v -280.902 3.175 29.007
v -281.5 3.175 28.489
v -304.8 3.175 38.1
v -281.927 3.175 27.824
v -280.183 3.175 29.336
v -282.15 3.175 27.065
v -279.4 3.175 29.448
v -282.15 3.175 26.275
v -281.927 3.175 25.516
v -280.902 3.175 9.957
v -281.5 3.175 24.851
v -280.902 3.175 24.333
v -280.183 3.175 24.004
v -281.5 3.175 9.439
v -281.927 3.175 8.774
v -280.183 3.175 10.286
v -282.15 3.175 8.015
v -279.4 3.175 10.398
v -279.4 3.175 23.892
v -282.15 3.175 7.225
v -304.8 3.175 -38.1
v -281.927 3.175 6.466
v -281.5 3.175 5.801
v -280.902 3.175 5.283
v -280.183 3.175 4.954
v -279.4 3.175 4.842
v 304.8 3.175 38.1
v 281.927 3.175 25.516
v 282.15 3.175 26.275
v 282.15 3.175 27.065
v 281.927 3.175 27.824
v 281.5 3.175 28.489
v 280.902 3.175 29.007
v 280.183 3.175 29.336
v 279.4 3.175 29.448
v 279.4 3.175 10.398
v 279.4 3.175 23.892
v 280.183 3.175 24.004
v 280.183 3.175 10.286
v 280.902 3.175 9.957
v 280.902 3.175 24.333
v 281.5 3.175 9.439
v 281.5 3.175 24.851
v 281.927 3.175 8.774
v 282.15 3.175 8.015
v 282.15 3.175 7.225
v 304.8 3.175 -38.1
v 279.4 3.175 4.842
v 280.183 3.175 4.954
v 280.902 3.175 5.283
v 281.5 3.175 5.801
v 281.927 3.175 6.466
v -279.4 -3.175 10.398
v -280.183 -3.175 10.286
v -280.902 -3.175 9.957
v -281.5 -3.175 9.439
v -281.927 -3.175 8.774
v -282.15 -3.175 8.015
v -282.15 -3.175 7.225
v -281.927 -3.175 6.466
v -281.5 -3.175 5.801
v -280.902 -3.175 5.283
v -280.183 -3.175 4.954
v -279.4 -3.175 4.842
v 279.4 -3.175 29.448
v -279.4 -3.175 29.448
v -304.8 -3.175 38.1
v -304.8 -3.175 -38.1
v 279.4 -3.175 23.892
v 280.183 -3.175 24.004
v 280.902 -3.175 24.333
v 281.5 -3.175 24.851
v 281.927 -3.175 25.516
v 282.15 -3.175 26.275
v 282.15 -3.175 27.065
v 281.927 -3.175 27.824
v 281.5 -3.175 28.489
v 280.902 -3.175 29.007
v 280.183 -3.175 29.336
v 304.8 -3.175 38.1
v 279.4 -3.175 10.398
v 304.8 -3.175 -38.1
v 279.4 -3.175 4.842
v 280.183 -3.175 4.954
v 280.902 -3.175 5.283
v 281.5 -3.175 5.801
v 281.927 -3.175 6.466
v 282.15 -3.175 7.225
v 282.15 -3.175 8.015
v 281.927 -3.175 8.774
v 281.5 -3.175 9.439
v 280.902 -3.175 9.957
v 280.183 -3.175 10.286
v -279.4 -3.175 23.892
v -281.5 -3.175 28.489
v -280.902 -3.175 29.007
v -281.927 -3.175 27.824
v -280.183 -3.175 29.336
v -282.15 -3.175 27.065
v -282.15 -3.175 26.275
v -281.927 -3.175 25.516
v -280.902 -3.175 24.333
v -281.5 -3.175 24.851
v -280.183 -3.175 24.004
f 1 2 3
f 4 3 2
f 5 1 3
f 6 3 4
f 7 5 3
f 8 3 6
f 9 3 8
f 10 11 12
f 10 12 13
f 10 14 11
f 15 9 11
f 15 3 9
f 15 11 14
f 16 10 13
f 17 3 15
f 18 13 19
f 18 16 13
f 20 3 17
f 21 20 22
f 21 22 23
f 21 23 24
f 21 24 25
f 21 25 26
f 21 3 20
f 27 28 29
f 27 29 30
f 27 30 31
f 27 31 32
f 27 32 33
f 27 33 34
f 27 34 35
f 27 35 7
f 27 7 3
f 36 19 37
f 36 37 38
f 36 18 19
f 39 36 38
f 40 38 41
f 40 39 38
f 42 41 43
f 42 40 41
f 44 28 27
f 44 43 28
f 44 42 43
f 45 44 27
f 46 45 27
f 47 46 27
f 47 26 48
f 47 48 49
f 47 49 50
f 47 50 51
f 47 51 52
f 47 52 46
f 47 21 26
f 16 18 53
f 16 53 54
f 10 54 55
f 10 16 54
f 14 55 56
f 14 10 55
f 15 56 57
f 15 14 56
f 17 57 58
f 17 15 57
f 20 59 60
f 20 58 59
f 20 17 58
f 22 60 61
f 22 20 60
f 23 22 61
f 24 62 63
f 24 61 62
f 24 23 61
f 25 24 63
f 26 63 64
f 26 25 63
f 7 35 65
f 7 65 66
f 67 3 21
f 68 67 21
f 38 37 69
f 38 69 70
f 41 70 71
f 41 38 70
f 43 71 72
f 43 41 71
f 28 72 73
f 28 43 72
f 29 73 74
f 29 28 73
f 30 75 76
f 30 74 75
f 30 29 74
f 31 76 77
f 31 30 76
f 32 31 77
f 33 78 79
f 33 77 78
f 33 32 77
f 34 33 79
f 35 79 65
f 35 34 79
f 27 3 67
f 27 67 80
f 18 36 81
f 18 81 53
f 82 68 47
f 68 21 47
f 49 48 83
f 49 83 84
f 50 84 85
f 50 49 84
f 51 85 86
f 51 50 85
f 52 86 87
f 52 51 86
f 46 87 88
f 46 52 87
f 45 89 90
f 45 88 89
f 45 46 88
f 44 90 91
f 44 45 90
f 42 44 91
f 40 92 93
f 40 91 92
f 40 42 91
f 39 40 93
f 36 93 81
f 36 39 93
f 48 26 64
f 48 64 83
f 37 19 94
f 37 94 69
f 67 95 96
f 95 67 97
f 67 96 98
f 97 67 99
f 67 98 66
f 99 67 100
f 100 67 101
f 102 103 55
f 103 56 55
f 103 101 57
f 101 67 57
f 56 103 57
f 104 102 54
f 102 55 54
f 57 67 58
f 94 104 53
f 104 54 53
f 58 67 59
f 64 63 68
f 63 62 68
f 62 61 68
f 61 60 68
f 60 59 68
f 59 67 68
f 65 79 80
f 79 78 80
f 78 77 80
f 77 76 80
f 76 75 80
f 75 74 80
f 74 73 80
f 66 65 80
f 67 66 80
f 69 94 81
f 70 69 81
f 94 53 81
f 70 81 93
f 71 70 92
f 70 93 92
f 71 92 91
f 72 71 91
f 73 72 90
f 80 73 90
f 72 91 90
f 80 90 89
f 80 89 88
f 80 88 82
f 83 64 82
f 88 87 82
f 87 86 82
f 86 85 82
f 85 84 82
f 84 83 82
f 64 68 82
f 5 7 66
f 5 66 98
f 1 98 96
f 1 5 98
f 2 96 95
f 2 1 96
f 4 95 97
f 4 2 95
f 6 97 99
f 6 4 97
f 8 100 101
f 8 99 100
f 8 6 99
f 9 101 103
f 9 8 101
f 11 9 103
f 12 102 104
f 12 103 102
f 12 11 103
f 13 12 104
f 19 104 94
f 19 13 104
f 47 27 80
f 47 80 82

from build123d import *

# Parameters (mm, degrees)
SKETCH1_W           = 609.6
SKETCH1_H           = 76.2
BOSS_EXTRUDE1_DEPTH = 3.175
CUT_EXTRUDE1_DEPTH  = 308.237648246


with BuildPart() as part:
    # Sketch1 → Boss-Extrude1 (new, symmetric)
    with BuildSketch(Plane(origin=(0, 0, 0), x_dir=(1, 0, 0), z_dir=(0, 1, 0))):
        Rectangle(SKETCH1_W, SKETCH1_H)
    extrude(amount=BOSS_EXTRUDE1_DEPTH, both=True)

    # Sketch2 → Cut-Extrude1 (cut, through all)
    with BuildSketch(Plane(origin=(0, 3.175, 0), x_dir=(1, 0, 0), z_dir=(0, 1, 0))):
        with BuildLine():
            Line((-279.4, -4.841875), (279.4, -4.841875))
            ThreePointArc((279.4, -4.841875), (282.178125, -7.62), (279.4, -10.398125))
            Line((279.4, -10.398125), (-279.4, -10.398125))
            ThreePointArc((-279.4, -10.398125), (-282.178125, -7.62), (-279.4, -4.841875))
        make_face()
        with BuildLine():
            Line((-279.4, -23.891875), (279.4, -23.891875))
            ThreePointArc((279.4, -23.891875), (282.178125, -26.67), (279.4, -29.448125))
            Line((279.4, -29.448125), (-279.4, -29.448125))
            ThreePointArc((-279.4, -29.448125), (-282.178125, -26.67), (-279.4, -23.891875))
        make_face()
    extrude(amount=-CUT_EXTRUDE1_DEPTH, mode=Mode.SUBTRACT)


solid = part.part
